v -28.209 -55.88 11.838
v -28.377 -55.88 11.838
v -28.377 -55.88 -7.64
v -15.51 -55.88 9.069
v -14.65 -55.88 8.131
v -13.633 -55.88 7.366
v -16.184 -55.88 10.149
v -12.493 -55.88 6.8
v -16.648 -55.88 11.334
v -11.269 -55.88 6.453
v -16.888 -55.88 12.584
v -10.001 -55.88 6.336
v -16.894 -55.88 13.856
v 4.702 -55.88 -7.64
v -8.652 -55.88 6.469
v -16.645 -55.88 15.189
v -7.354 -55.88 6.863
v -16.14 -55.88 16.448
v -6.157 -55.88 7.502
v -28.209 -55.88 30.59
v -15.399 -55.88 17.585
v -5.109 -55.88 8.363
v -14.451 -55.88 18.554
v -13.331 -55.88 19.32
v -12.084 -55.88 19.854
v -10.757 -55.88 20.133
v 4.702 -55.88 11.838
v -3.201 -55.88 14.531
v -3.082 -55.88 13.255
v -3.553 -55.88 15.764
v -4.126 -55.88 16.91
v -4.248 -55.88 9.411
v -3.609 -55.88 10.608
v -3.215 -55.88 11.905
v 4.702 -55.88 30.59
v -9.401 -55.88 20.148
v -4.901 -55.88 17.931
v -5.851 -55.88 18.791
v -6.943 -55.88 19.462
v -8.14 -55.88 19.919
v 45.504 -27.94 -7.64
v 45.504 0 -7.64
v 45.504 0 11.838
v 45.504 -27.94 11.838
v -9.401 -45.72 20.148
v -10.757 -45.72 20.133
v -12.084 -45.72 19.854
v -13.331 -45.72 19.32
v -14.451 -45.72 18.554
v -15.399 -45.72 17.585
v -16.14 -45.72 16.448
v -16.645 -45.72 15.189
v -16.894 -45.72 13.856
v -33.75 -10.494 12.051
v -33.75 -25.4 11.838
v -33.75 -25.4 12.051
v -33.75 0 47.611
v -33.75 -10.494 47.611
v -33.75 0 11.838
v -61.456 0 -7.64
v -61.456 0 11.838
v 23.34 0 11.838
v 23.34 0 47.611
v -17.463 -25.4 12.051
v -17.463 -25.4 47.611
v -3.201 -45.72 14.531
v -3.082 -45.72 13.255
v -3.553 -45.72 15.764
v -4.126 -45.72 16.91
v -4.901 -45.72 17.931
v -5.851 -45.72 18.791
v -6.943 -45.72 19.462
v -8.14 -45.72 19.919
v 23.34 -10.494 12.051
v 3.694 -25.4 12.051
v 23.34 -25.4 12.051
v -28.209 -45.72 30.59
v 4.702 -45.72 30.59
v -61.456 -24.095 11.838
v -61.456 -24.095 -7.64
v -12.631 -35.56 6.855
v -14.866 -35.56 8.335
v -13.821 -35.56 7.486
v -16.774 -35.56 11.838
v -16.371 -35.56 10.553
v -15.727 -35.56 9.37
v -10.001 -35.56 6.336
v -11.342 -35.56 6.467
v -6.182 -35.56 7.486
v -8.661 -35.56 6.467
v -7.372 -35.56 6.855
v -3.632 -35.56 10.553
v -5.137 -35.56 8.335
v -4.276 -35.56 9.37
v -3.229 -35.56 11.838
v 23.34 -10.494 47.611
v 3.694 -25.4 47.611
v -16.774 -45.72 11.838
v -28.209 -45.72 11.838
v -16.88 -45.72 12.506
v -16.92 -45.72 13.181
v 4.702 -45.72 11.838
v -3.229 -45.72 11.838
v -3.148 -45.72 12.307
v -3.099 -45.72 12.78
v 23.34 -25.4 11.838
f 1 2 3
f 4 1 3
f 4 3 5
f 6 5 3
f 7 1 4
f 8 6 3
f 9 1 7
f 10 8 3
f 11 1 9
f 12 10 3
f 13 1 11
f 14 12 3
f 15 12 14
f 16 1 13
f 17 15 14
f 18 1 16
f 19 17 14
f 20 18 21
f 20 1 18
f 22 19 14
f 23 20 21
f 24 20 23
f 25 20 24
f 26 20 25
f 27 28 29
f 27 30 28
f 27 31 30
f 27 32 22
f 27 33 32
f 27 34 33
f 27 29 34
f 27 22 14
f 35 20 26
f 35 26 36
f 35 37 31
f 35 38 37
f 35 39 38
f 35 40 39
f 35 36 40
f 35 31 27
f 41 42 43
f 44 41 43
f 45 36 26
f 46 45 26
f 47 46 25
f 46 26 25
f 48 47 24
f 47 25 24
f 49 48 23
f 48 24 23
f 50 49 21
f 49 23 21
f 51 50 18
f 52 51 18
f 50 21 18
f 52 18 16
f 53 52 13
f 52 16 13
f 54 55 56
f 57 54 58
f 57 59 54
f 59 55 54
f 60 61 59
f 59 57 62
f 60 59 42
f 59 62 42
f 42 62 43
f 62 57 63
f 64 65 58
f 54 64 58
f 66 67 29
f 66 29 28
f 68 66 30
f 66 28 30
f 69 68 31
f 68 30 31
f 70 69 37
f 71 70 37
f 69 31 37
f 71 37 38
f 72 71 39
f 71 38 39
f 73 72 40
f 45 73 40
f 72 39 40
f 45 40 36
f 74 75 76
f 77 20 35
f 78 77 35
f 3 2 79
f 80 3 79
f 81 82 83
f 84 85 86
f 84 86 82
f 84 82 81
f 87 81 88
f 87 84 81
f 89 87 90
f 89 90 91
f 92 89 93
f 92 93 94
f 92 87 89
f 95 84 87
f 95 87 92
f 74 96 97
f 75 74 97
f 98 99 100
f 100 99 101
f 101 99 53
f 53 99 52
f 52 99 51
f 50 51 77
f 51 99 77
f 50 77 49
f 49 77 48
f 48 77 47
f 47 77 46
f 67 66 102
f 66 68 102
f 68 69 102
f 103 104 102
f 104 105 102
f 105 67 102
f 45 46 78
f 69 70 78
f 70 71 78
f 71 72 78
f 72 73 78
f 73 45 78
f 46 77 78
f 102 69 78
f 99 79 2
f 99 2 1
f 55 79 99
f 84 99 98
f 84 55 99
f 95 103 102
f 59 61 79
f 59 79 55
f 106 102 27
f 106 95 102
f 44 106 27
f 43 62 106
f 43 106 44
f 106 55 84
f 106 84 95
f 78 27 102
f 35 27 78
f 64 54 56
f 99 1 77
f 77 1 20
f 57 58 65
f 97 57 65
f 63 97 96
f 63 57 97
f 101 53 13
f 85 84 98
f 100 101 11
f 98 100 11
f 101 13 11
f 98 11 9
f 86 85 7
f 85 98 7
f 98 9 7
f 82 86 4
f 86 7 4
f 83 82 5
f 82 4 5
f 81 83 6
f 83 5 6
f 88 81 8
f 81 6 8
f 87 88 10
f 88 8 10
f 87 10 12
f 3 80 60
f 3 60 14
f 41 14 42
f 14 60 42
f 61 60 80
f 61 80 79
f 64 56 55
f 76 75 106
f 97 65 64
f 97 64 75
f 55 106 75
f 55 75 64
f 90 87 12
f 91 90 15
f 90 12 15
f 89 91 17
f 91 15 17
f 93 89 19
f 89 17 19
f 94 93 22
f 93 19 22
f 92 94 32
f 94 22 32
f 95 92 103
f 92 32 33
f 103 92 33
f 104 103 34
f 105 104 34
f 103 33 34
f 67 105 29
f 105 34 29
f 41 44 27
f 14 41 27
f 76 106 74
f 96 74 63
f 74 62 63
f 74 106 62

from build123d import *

# Parameters (mm, degrees)
F0_W      = 106.9598533213
F0_H      = 19.4777743891
F1_DEPTH  = 55.88
F3_DEPTH  = 25.4
F4_W      = 57.0900328457
F4_H      = 35.8569398522
F5_DEPTH  = 25.4
F7_DEPTH  = 35.56
F8_W      = 32.9107241705
F8_H      = 18.7523802742
F9_DEPTH  = 10.16
F11_DEPTH = 20.32


with BuildPart() as f1:
    # F0 (on Front) → F1 (new body)
    with BuildSketch(Plane.XZ):
        with Locations((-7.975814864, 2.0988979377)):
            Rectangle(F0_W, F0_H)
    extrude(amount=F1_DEPTH)

    # F2 (on face) → F3 (cut)
    with BuildSketch(Plane.XY.offset(11.8377851322)):
        Polygon((45.5041117966, -27.94), (4.7015314922, -55.88), (45.5041117966, -55.88), align=None)
        Polygon((-61.4557415247, -55.88), (-28.377102688, -55.88), (-61.4557415247, -24.0953527391), align=None)
    extrude(amount=-F3_DEPTH, mode=Mode.SUBTRACT)

    # F4 (on Front) → F5 (join)
    with BuildSketch(Plane.XZ):
        with Locations((-5.2052680403, 29.6829007566)):
            Rectangle(F4_W, F4_H)
    extrude(amount=F5_DEPTH)

    # F6 (on face) → F7 (cut)
    with BuildSketch(Plane.XY.offset(47.6113706827)):
        Polygon((23.3397483826, -10.4944910854), (3.6940614227, -25.4), (23.3397483826, -25.4), align=None)
        Polygon((-33.7502844632, -25.4), (-17.4628347158, -25.4), (-33.7502844632, -10.4944910854), align=None)
    extrude(amount=-F7_DEPTH, mode=Mode.SUBTRACT)

    # F8 (on face) → F9 (join)
    with BuildSketch(Plane.XZ.offset(55.88)):
        with Locations((-11.7538305931, 21.2139752693)):
            Rectangle(F8_W, F8_H)
    extrude(amount=-F9_DEPTH)

    # F10 (on face) → F11 (cut)
    with BuildSketch(Plane.XZ.offset(55.88)):
        with BuildLine():
            Line((-3.0823028615, 13.2553465664), (-10.0014163181, 13.2553465664))
            Line((-10.0014163181, 13.2553465664), (-10.0014163181, 6.3362331098))
            ThreePointArc((-10.0014163181, 6.3362331098), (-5.1088642731, 8.3627945214), (-3.0823028615, 13.2553465664))
        make_face()
        with BuildLine():
            Line((-10.0014163181, 6.3362331098), (-10.0014163181, 13.2553465664))
            Line((-10.0014163181, 13.2553465664), (-16.8943863629, 13.856258363))
            ThreePointArc((-16.8943863629, 13.856258363), (-15.1020000065, 8.5800736264), (-10.0014163181, 6.3362331098))
        make_face()
        with BuildLine():
            Line((-16.8943863629, 13.856258363), (-10.0014163181, 13.2553465664))
            Line((-10.0014163181, 13.2553465664), (-9.4005045216, 20.1483166113))
            ThreePointArc((-9.4005045216, 20.1483166113), (-14.4505733731, 18.5543212339), (-16.8943863629, 13.856258363))
        make_face()
        with BuildLine():
            Line((-9.4005045216, 20.1483166113), (-10.0014163181, 13.2553465664))
            Line((-10.0014163181, 13.2553465664), (-3.0823028615, 13.2553465664))
            ThreePointArc((-3.0823028615, 13.2553465664), (-4.9008326298, 17.9306195065), (-9.4005045216, 20.1483166113))
        make_face()
    extrude(amount=-F11_DEPTH, mode=Mode.SUBTRACT)


solid = f1.part
